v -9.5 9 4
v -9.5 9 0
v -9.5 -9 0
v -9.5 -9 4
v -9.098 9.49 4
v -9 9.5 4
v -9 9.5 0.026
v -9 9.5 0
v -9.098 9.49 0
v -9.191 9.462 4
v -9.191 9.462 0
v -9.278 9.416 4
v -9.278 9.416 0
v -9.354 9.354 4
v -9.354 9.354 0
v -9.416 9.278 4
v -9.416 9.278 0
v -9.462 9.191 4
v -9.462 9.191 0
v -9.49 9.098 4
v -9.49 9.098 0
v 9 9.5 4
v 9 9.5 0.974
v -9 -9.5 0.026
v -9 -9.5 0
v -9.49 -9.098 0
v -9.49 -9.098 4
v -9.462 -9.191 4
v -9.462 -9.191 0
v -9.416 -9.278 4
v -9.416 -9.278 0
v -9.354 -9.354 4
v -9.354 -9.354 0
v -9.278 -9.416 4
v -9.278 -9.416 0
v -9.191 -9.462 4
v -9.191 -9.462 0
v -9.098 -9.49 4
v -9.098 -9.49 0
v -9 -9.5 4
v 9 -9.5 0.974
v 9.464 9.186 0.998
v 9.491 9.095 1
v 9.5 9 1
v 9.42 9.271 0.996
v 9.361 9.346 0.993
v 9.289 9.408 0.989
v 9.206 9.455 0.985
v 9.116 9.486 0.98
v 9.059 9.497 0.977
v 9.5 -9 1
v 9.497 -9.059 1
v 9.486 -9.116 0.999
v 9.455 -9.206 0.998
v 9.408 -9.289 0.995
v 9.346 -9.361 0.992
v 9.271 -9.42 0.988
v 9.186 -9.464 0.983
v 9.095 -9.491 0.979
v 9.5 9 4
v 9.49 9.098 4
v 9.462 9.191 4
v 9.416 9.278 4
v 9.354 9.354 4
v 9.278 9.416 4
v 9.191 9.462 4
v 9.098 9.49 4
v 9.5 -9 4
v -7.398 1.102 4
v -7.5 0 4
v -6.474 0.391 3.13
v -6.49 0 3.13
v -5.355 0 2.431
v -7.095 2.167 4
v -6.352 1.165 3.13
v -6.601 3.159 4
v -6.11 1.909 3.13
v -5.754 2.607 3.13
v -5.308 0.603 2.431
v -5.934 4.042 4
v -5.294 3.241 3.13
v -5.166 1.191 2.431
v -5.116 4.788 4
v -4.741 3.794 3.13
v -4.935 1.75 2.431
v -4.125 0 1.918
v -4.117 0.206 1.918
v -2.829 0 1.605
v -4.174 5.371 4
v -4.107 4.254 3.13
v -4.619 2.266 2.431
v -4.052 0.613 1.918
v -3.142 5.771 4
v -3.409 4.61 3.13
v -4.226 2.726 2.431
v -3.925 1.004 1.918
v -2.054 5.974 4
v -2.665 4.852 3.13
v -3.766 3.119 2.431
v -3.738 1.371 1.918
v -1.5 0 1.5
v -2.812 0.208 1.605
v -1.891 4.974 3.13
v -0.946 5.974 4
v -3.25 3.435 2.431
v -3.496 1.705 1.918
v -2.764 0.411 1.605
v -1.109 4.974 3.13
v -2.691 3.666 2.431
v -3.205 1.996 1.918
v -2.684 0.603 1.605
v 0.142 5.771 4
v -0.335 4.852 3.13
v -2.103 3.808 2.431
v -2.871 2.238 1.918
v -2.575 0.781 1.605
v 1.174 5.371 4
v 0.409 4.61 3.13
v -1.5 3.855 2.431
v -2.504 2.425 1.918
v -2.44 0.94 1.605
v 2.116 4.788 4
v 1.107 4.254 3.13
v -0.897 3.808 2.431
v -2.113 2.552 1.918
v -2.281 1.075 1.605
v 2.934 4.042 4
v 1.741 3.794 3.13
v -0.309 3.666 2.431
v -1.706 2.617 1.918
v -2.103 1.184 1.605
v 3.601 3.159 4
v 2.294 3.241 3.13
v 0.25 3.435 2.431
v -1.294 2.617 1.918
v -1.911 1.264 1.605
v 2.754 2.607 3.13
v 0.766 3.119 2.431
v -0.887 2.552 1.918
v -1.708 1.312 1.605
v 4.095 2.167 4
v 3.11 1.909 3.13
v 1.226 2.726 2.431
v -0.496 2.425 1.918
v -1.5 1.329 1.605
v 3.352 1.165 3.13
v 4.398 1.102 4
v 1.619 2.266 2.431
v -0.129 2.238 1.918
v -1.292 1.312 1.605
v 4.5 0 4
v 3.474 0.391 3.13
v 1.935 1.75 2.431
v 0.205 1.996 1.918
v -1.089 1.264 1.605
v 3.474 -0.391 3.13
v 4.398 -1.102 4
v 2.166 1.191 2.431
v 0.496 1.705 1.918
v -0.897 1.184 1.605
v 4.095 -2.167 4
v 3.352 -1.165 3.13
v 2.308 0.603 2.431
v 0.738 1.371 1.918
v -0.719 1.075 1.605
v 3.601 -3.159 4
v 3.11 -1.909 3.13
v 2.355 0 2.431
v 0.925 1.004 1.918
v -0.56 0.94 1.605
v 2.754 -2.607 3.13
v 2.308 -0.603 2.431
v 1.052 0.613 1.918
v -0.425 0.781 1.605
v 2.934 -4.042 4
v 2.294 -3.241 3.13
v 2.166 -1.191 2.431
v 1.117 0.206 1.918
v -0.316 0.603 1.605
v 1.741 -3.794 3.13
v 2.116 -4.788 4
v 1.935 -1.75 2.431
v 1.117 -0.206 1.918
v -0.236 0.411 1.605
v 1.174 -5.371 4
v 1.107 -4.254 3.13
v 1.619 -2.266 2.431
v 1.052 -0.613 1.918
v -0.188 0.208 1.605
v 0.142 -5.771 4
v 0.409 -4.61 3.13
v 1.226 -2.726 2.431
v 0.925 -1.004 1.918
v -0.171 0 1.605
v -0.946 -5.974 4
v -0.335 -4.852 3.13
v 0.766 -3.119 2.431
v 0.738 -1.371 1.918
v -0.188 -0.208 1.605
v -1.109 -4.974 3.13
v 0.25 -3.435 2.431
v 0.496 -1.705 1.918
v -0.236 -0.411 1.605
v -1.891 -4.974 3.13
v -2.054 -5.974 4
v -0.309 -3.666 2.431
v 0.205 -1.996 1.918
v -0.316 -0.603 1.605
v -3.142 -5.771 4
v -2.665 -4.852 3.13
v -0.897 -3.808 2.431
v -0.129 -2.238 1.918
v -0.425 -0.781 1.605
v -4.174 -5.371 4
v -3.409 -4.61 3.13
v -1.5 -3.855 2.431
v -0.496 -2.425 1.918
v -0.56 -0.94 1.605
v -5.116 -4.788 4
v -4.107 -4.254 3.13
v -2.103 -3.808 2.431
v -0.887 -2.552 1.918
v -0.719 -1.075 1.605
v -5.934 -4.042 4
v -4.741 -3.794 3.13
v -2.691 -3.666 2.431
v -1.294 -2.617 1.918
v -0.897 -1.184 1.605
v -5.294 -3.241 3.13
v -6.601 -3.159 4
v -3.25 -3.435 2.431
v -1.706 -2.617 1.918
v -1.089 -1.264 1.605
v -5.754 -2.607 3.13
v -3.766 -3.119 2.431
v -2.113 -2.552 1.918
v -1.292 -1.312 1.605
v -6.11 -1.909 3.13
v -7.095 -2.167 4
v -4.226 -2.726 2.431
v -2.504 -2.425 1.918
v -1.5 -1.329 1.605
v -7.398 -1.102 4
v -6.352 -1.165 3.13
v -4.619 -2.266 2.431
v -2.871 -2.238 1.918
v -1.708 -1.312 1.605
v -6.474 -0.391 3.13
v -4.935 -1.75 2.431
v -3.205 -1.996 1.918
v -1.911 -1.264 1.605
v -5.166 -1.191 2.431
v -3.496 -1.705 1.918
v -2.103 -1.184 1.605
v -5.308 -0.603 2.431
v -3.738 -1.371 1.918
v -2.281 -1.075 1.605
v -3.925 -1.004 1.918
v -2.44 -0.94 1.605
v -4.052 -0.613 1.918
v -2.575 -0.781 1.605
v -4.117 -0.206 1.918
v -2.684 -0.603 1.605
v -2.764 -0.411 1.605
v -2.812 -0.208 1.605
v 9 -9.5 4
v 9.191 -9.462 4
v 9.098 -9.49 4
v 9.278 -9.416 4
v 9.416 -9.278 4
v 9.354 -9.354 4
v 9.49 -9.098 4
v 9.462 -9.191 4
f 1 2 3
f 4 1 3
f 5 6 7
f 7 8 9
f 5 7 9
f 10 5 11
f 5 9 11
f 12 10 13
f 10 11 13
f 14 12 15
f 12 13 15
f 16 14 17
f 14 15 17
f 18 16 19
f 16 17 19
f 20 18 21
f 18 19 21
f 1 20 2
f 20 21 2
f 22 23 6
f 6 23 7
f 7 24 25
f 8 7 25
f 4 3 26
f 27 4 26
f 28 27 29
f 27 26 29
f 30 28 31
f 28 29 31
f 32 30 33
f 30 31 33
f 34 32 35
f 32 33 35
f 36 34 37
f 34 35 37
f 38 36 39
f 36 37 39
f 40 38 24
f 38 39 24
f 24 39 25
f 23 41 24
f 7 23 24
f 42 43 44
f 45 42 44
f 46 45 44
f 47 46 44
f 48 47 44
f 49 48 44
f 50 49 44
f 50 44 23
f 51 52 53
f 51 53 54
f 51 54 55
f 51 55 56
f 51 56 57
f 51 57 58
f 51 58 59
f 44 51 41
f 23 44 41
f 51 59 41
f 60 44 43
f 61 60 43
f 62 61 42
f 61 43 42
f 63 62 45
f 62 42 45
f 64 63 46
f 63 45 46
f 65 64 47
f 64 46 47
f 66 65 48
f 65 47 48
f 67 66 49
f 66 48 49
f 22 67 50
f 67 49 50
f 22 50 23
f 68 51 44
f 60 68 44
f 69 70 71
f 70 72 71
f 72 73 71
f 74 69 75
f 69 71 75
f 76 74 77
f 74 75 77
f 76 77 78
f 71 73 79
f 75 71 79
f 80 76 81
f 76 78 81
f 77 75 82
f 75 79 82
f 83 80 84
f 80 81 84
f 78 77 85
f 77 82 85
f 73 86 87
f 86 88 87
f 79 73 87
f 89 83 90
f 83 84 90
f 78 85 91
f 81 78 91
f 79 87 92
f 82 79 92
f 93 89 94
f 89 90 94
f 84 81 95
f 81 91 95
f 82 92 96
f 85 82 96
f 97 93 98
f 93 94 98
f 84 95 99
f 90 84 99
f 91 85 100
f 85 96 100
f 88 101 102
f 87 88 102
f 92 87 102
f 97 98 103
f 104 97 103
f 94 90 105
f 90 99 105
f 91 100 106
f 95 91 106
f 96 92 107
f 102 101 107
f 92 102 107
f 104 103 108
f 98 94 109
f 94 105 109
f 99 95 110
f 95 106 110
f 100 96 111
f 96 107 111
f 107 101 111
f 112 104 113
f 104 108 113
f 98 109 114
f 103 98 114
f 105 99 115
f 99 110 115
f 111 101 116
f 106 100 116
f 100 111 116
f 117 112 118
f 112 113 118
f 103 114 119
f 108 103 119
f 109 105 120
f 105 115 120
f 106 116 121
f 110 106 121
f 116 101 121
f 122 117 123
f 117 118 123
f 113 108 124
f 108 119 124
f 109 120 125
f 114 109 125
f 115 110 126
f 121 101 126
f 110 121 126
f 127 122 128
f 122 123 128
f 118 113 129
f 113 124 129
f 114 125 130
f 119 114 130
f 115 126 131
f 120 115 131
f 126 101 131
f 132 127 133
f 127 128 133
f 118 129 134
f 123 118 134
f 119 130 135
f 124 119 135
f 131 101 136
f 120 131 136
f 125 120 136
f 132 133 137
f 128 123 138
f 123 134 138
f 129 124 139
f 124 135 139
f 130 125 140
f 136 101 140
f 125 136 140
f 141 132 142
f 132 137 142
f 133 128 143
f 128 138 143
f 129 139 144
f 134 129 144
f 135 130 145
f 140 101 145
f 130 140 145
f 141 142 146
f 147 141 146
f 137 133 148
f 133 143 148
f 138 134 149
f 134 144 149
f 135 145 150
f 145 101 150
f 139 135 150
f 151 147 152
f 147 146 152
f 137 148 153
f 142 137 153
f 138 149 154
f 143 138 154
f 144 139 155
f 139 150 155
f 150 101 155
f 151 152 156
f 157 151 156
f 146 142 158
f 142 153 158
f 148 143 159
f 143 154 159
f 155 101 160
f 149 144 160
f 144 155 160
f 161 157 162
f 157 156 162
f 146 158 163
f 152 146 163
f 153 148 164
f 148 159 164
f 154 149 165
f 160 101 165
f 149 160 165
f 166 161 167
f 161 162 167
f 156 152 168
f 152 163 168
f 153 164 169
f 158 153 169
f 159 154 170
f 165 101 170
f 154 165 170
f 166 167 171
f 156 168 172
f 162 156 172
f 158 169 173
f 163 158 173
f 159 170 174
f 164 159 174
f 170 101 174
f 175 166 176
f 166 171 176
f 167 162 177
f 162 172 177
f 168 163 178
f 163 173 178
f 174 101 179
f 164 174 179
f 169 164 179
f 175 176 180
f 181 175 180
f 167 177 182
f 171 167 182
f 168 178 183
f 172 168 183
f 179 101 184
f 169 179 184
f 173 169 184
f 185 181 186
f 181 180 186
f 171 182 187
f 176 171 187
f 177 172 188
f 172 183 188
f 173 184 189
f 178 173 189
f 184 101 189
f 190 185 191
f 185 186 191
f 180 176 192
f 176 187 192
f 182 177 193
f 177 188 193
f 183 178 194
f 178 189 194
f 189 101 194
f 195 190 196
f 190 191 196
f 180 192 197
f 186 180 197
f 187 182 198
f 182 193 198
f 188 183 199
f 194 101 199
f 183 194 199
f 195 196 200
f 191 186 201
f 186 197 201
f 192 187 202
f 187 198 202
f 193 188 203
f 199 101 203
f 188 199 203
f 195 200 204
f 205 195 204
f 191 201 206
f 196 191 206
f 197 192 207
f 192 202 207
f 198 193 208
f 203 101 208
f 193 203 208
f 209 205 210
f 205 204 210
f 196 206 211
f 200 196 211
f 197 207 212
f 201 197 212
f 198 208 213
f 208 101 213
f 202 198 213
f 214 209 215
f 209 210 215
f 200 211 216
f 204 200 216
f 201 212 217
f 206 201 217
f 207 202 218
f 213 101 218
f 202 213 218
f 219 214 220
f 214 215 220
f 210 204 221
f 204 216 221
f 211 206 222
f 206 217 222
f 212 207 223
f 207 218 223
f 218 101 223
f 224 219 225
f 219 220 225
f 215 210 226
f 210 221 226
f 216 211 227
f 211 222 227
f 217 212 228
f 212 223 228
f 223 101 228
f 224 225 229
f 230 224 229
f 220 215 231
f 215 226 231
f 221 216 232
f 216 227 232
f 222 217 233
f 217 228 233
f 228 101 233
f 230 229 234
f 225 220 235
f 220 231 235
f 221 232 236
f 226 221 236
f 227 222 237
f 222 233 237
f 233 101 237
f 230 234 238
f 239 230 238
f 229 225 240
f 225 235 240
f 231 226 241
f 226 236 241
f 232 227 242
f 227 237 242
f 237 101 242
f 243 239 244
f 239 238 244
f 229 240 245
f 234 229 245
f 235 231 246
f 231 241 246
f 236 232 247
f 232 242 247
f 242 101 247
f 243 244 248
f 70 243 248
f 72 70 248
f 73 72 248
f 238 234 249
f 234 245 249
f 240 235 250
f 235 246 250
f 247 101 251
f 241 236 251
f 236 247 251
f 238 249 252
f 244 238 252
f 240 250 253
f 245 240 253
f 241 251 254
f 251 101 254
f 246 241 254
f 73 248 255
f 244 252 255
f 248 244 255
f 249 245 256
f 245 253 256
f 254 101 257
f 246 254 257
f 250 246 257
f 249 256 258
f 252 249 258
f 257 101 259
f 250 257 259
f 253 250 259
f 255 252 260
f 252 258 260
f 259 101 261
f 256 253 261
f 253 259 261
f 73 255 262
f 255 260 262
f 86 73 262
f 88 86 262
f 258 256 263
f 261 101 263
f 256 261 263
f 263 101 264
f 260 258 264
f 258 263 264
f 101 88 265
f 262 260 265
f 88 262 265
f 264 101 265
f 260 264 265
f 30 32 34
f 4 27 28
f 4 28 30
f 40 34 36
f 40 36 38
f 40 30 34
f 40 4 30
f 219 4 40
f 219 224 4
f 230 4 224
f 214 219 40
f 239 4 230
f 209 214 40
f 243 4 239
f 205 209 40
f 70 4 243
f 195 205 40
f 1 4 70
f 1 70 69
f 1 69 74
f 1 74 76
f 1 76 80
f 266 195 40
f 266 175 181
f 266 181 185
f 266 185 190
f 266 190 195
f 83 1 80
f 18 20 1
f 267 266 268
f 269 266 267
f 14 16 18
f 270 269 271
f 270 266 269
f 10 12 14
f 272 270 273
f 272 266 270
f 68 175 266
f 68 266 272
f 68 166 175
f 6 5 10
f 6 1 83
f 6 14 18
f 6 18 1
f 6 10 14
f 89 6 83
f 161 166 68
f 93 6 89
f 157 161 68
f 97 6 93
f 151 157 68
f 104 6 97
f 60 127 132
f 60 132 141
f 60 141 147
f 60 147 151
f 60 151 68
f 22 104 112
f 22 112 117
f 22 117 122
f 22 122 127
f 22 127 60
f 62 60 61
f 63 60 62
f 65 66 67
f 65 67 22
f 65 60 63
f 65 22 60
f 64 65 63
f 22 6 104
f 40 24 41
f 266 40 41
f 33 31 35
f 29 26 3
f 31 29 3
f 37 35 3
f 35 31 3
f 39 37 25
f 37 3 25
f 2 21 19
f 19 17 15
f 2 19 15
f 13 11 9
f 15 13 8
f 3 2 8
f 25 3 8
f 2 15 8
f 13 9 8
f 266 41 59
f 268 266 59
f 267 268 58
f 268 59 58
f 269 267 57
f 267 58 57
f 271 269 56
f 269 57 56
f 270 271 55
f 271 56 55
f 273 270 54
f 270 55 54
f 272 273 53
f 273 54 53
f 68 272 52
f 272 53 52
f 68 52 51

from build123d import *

# Parameters (mm, degrees)
F1_DEPTH = 4
F3_DEPTH = 19


with BuildPart() as f1:
    # F0 (on Top) → F1 (new body)
    with BuildSketch(Plane.XY):
        with BuildLine():
            ThreePointArc((9.5, 9), (9.3535533906, 9.3535533906), (9, 9.5))
            Line((9, 9.5), (-9, 9.5))
            ThreePointArc((-9, 9.5), (-9.3535533906, 9.3535533906), (-9.5, 9))
            Line((-9.5, 9), (-9.5, -9))
            ThreePointArc((-9.5, -9), (-9.3535533906, -9.3535533906), (-9, -9.5))
            Line((-9, -9.5), (9, -9.5))
            ThreePointArc((9, -9.5), (9.3535533906, -9.3535533906), (9.5, -9))
            Line((9.5, -9), (9.5, 9))
        make_face()
    extrude(amount=F1_DEPTH)

    # F2 (on face) → F3 (cut, through all)
    with BuildSketch(Plane.XZ.offset(9.5)):
        Polygon((9, 0.9736842105), (-9, 0.0263157895), (-9, 0), (9, 0), align=None)
        Polygon((9.5, 1), (9, 0.9736842105), (9, 0), (9.5, 0), align=None)
    extrude(amount=-F3_DEPTH, mode=Mode.SUBTRACT)

    # F4 (on Front) → F5 (revolve, cut)
    with BuildSketch(Plane.XZ):
        with BuildLine():
            Line((-1.5, 4), (-7.5, 4))
            ThreePointArc((-7.5, 4), (-4.75, 2.15), (-1.5, 1.5))
            Line((-1.5, 1.5), (-1.5, 4))
        make_face()
    revolve(axis=Axis((-1.5, 0, 2.3585720337), (0, 0, -1)), mode=Mode.SUBTRACT)


solid = f1.part
